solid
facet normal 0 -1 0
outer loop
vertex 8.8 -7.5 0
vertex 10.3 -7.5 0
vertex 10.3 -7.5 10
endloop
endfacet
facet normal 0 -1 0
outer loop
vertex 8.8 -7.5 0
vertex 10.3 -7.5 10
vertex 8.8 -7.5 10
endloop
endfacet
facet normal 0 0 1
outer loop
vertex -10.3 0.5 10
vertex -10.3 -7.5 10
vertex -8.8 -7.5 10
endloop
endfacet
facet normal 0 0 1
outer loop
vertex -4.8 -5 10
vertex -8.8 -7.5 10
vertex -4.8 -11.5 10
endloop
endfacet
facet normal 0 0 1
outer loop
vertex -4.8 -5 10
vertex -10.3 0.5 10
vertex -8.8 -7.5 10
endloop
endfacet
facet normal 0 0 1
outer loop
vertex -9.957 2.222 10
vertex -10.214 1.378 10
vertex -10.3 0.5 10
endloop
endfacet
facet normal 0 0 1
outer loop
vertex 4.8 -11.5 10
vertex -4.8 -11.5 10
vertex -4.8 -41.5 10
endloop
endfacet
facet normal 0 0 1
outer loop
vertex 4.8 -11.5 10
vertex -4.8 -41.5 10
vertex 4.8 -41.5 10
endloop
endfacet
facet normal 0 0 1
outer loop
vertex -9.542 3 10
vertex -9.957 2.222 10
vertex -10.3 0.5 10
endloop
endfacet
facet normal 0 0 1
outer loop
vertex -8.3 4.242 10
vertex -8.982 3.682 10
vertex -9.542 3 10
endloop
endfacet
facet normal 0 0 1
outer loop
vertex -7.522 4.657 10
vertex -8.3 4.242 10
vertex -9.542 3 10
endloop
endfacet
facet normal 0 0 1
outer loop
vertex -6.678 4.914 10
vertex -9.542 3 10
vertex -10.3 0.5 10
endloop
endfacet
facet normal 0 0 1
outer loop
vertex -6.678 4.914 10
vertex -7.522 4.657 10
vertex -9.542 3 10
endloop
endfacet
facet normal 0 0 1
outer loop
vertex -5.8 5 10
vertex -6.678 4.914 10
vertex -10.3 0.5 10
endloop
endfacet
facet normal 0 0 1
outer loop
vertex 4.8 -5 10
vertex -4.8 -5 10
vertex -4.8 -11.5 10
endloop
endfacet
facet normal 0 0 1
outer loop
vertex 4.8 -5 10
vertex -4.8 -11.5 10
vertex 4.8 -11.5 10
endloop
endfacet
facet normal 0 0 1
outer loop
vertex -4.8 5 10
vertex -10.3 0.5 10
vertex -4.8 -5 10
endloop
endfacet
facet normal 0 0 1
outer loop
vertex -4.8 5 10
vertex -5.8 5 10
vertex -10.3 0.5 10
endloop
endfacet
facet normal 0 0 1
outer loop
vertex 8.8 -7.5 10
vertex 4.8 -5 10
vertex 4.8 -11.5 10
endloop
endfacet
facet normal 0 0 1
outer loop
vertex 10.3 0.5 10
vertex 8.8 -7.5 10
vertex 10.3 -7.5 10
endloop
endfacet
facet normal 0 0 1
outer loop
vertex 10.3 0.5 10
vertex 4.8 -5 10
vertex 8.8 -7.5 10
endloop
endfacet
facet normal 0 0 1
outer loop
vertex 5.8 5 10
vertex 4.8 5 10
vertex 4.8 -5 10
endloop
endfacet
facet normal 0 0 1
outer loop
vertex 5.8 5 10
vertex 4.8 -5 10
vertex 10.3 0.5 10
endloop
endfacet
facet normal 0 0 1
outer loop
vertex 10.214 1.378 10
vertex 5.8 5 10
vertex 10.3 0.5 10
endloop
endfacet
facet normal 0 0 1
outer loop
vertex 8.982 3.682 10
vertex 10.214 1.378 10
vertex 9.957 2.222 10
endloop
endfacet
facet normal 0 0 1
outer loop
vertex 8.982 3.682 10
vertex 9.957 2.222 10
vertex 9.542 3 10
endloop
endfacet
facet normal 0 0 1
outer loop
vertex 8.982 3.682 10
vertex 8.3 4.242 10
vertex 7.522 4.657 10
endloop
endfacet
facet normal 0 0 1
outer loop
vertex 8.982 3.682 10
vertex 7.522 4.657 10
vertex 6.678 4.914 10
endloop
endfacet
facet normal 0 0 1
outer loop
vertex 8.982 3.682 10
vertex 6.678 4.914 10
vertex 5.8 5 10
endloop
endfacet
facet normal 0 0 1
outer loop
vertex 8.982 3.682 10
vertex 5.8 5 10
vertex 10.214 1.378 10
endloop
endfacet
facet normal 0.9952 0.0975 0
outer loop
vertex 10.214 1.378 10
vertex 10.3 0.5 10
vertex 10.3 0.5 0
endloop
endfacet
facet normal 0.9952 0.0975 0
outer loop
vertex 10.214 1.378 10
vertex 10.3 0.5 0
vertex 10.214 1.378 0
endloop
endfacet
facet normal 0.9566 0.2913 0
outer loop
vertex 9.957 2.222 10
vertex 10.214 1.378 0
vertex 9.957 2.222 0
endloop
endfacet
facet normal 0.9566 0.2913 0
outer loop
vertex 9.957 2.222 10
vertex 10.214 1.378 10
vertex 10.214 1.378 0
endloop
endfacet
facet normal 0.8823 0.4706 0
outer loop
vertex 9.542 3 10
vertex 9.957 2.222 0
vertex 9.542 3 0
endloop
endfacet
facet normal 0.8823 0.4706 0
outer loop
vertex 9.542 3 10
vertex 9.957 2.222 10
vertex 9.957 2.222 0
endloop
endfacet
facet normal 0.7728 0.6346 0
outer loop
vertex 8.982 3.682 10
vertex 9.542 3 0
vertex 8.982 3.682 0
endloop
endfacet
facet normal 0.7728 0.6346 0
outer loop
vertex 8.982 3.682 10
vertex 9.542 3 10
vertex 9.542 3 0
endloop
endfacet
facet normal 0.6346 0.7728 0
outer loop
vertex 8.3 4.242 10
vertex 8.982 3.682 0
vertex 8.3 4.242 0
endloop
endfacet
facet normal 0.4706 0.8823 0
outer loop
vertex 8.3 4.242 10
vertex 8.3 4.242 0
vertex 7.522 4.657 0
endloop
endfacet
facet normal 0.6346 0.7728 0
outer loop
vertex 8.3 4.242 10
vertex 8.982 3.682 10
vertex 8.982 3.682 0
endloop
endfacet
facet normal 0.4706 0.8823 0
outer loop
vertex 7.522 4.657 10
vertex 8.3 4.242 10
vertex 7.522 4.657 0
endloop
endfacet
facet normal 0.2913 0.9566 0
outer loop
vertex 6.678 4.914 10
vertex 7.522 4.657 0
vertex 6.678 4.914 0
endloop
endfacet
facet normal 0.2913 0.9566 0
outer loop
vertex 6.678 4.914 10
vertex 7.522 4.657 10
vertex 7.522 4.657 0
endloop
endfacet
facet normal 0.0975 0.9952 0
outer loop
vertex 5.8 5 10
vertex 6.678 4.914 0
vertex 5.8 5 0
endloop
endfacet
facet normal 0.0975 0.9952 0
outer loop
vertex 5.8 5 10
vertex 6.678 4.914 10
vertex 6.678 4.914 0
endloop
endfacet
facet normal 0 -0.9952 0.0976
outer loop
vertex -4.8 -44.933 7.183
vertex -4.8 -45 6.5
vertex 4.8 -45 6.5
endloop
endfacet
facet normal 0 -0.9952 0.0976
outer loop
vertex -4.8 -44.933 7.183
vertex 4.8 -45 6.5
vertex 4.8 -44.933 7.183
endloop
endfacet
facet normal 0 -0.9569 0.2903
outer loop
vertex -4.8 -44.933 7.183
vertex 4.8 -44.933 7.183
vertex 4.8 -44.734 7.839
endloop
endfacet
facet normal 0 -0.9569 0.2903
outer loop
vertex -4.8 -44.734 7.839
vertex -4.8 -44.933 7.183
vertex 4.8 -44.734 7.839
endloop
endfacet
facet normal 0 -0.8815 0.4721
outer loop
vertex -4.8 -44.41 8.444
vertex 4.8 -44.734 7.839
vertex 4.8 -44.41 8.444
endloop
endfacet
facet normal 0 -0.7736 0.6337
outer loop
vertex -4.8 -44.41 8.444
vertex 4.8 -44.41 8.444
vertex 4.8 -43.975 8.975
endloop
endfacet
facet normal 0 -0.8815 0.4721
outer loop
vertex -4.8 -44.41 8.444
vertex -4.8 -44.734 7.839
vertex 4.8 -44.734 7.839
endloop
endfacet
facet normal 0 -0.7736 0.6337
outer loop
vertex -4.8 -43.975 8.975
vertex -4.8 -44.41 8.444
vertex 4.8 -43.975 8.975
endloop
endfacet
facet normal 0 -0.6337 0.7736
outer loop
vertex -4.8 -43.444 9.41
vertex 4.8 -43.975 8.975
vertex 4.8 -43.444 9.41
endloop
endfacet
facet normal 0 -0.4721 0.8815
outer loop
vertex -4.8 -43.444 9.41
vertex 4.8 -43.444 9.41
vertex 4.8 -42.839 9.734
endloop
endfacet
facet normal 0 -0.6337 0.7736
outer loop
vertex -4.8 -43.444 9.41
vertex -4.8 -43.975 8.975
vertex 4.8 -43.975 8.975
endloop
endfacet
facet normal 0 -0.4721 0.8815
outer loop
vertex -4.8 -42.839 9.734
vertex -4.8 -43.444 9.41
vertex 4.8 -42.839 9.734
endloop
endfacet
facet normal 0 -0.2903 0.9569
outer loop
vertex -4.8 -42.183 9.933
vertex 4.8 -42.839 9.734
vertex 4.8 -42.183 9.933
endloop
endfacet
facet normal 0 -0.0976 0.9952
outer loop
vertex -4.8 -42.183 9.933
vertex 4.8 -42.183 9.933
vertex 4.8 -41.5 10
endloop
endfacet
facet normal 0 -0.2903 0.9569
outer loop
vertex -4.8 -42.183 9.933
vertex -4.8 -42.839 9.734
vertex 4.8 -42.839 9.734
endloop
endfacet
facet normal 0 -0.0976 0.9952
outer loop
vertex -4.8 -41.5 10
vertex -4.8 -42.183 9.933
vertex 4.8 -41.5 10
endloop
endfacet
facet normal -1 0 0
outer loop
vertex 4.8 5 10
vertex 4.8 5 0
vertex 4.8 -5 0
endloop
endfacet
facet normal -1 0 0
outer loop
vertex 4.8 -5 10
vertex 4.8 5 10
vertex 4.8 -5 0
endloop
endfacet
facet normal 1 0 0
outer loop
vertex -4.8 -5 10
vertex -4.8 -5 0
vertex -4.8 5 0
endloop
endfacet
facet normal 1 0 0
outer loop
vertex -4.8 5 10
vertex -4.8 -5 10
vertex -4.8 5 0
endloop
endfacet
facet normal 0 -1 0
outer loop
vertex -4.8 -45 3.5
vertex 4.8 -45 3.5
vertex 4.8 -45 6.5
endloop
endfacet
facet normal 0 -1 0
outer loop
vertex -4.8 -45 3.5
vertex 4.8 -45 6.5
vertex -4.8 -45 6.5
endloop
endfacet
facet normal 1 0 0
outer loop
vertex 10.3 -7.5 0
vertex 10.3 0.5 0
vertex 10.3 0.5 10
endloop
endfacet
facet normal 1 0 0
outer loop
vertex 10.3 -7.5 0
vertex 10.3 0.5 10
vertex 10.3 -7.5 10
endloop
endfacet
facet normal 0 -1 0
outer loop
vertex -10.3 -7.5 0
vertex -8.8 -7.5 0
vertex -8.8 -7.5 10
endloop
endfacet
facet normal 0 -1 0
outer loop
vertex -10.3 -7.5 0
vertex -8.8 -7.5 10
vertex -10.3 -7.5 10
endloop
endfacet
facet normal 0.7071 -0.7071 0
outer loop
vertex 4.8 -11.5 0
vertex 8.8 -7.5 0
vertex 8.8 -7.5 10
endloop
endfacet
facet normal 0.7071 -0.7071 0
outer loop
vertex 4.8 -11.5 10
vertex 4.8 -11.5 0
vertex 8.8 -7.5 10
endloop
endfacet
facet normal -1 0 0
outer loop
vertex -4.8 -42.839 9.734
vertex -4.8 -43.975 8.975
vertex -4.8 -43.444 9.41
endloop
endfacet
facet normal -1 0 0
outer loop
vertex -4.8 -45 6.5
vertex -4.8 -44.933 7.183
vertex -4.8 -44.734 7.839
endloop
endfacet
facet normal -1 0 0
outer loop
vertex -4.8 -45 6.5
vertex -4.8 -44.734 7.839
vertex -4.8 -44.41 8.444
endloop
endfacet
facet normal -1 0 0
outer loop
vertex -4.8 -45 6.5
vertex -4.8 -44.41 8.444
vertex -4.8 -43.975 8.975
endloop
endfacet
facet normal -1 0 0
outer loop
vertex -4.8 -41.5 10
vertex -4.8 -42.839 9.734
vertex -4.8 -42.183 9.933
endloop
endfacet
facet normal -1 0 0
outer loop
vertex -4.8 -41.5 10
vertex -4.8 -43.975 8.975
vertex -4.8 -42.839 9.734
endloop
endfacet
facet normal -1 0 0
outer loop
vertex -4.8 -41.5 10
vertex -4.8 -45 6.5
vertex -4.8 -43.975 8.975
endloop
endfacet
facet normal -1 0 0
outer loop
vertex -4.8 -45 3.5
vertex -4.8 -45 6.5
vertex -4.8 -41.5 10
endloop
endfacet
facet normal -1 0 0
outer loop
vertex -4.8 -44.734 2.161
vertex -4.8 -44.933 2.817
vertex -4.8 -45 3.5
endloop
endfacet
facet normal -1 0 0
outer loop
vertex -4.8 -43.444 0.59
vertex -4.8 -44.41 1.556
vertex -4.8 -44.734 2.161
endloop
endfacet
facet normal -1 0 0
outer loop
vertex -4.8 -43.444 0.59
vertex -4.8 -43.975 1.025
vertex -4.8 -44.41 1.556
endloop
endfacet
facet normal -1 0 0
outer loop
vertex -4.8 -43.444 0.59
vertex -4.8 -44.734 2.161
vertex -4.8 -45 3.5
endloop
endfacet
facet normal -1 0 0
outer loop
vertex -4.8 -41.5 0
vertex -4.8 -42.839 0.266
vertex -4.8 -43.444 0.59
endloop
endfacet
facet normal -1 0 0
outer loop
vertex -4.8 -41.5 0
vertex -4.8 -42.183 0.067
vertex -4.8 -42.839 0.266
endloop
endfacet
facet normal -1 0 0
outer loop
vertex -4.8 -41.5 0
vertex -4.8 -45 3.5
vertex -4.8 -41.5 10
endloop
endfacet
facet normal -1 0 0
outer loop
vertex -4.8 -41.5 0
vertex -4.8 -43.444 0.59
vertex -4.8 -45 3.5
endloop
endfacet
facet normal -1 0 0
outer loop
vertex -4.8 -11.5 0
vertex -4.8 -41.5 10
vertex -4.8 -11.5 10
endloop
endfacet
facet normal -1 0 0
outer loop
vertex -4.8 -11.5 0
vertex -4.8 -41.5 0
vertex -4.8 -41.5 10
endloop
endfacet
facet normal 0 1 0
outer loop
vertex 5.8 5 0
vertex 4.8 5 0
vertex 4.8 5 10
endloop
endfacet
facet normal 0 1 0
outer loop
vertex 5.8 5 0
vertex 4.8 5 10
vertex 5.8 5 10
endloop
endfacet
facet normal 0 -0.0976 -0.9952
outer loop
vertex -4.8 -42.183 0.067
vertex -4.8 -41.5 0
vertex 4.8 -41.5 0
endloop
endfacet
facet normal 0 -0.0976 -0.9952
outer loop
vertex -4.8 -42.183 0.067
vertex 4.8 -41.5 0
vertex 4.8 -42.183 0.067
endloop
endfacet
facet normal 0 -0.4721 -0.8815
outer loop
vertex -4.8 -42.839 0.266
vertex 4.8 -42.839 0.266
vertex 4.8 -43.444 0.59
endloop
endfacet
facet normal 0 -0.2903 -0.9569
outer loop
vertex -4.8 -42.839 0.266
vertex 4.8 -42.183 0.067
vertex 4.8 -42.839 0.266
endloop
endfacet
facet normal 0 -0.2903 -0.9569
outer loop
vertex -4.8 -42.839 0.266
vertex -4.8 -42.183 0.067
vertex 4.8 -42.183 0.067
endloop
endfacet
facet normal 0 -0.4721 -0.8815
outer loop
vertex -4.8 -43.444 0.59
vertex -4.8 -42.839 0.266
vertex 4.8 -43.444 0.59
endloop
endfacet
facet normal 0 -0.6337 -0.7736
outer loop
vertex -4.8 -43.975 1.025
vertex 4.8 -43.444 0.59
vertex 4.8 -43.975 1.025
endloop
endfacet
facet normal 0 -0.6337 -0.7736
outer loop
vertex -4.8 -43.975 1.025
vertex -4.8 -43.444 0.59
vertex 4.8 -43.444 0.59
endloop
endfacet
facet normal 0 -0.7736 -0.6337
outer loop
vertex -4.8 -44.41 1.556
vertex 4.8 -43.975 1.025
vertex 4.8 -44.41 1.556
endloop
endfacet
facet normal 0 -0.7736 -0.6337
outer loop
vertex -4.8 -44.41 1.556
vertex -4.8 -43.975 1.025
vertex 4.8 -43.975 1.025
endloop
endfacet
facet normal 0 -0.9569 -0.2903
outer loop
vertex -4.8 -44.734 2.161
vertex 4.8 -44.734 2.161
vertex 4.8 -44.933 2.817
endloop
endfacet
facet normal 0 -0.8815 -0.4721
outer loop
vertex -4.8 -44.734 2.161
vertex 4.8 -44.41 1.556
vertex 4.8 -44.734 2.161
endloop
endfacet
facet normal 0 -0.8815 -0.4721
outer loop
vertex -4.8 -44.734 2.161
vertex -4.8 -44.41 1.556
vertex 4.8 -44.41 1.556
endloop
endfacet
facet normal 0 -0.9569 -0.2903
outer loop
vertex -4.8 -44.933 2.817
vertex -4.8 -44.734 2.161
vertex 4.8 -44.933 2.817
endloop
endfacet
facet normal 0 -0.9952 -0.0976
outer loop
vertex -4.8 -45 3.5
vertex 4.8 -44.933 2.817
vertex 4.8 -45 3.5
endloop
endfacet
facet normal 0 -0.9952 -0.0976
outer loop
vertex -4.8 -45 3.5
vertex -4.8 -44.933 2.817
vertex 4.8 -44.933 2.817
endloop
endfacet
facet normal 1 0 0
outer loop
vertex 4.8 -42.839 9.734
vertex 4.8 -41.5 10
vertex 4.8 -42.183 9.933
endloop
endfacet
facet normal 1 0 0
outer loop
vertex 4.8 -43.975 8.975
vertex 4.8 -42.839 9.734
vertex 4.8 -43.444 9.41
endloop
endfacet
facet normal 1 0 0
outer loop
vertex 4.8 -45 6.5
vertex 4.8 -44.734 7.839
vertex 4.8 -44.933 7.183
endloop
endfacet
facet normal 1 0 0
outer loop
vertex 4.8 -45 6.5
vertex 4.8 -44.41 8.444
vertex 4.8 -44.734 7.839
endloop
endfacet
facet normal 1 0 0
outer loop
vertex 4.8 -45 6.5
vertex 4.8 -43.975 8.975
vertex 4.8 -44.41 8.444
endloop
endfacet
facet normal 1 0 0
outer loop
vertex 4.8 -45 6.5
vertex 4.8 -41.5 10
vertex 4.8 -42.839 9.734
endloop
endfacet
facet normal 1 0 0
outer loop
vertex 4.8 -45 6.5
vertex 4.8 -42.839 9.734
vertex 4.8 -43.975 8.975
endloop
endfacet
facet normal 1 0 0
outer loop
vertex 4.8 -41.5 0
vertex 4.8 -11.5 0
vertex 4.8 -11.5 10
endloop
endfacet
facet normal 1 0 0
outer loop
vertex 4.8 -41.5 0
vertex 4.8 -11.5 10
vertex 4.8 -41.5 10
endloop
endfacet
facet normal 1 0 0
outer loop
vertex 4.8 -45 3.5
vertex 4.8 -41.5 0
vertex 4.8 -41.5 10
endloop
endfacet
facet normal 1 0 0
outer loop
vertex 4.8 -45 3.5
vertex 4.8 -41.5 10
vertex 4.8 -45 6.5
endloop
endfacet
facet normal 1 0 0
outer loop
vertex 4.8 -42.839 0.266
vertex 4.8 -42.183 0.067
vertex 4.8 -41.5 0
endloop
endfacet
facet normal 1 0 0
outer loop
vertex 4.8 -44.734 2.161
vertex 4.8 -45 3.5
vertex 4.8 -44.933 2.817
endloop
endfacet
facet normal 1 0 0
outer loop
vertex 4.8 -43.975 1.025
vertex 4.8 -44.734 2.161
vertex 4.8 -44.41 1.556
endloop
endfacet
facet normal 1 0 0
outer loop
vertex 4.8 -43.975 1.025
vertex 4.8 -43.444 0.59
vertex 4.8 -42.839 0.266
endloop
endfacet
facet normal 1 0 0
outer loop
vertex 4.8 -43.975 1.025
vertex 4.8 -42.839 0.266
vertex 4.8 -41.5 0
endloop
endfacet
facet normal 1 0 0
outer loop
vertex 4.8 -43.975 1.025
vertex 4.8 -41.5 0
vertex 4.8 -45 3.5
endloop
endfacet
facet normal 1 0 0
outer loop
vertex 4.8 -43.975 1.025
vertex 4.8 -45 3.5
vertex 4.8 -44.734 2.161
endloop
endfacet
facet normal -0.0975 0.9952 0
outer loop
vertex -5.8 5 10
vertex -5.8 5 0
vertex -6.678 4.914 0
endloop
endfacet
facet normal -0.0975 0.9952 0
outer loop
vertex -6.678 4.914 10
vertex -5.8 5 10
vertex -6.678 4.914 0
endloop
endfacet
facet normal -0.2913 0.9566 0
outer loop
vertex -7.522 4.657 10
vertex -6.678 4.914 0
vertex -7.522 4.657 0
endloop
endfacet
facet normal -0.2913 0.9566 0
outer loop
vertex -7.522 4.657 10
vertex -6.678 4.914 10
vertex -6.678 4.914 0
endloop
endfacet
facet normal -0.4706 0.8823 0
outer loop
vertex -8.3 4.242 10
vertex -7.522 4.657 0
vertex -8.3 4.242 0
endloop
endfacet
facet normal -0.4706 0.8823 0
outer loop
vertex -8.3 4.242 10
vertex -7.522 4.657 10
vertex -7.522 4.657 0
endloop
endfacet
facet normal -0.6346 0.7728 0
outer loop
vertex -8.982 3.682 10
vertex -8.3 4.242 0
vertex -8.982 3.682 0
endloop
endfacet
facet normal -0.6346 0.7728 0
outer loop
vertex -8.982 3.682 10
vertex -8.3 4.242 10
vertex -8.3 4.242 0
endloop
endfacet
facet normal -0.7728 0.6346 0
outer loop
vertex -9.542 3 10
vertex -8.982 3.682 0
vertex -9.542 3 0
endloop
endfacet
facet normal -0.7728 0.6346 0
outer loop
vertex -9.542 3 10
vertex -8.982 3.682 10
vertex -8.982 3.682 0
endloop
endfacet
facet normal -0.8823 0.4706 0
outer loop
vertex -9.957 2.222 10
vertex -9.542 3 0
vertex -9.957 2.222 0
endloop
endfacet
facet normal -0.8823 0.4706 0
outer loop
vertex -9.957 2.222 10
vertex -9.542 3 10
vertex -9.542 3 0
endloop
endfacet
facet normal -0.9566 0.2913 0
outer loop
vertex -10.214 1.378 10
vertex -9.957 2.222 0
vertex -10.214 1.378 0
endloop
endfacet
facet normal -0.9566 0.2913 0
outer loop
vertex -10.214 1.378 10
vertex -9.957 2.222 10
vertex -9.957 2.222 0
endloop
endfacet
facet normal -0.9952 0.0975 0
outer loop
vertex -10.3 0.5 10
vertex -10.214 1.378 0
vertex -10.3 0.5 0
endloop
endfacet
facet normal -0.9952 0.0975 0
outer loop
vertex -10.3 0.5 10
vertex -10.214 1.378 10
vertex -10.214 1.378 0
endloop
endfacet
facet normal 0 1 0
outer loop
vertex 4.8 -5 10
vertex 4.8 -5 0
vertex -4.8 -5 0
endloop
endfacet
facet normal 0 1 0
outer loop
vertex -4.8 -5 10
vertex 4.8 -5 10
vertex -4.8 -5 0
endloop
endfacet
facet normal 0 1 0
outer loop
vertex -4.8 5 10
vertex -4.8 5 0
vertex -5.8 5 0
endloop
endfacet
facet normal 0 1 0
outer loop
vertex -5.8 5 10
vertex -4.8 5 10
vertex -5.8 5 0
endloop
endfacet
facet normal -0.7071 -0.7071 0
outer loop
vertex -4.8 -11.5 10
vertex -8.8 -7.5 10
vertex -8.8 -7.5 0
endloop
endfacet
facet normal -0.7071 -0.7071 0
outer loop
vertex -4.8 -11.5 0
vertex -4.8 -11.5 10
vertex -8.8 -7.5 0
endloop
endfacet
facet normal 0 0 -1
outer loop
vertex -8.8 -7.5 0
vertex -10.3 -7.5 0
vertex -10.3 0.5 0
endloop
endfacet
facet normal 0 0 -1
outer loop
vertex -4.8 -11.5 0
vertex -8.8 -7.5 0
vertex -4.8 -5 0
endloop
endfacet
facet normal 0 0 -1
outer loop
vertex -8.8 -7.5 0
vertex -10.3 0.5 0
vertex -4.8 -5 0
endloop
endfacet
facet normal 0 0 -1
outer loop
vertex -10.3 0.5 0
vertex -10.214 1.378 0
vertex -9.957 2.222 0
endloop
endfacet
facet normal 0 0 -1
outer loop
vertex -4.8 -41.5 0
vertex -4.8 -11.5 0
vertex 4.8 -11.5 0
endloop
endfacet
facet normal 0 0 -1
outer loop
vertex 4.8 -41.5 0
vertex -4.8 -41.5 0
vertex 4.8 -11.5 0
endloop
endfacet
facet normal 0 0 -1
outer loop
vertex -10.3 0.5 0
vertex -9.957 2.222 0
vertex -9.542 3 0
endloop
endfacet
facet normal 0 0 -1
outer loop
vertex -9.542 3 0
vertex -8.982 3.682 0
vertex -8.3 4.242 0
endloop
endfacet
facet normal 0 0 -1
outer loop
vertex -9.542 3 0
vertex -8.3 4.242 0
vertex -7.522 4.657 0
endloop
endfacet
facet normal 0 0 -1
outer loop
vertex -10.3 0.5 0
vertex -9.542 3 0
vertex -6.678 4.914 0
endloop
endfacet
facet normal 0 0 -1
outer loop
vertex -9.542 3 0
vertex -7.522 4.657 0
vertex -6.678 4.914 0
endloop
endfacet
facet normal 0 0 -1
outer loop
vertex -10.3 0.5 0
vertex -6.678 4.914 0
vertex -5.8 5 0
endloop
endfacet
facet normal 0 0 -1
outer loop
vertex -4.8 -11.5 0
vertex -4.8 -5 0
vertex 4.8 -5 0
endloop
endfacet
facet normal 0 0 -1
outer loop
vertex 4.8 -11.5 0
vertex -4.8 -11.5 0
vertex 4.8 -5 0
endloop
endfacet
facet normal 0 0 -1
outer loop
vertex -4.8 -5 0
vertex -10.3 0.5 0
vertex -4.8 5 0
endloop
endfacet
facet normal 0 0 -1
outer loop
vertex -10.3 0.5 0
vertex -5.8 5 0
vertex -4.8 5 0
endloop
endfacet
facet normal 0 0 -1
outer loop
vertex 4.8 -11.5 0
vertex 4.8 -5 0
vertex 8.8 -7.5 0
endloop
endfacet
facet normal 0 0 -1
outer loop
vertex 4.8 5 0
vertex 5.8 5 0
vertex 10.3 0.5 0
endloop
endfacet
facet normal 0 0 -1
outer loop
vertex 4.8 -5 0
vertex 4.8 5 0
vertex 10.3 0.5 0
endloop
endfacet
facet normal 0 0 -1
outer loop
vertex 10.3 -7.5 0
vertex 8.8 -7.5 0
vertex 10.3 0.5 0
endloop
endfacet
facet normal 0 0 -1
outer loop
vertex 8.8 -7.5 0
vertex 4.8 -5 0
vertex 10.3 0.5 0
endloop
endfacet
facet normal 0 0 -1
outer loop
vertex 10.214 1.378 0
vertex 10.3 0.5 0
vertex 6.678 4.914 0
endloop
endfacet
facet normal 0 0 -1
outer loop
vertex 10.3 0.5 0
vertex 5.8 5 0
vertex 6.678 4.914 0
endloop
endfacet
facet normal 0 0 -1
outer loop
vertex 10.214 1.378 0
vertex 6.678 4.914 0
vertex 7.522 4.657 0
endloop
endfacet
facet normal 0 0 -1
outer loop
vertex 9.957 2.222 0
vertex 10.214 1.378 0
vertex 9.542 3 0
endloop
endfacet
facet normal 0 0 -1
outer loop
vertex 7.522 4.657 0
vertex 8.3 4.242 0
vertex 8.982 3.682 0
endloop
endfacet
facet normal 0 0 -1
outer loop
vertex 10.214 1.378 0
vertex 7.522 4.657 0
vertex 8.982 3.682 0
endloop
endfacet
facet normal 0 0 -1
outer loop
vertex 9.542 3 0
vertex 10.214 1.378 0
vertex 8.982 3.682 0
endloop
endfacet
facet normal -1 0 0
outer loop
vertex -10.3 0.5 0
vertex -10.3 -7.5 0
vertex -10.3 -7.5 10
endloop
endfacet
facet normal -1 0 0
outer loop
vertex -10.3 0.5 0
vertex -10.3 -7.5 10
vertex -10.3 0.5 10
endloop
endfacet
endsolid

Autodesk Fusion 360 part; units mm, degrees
sketch "Sketch1" plane through (0, 0, 0) normal (0, 0, 1) x (1, 0, 0)
  line L0 (4.8, -5) -> (-4.8, -5)
  line L1 (-4.8, -5) -> (-4.8, 5)
  line L2 (4.8, 5) -> (4.8, -5)
  line L3 (4.8, -5) -> (-4.8, 5) construction
  line L4 (-4.8, -5) -> (4.8, 5) construction
  line L5 (-4.8, -5) -> (4.8, -5)
  line L6 (4.8, -7.5) -> (4.8, -45)
  line L7 (4.8, -45) -> (-4.8, -45)
  line L8 (-4.8, -45) -> (-4.8, -7.5)
  line L9 (-10.3, -7.5) -> (-10.3, 7.5)
  line L10 (10.3, 7.5) -> (10.3, -7.5)
  line L11 (10.3, -7.5) -> (-10.3, 7.5) construction
  line L12 (-10.3, -7.5) -> (10.3, 7.5) construction
  line L13 (4.8, 5) -> (10.3, 5)
  line L14 (-4.8, 5) -> (-10.3, 5)
  line L15 (10.3, -7.5) -> (4.8, -7.5)
  line L16 (-4.8, -7.5) -> (-10.3, -7.5)
  dimension "d1" = 9.6
  dimension "d3" = 9.6
  dimension "d4" = 40
  dimension "d5" = 20.6
extrude "Extrude1" add sketch "Sketch1" along normal blind 10
fillet "Fillet1" radius 3.5 2 edges at (0, -45, 10) (0, -45, 0)
chamfer "Chamfer1" distance 4 angle 45 2 edges at (-4.8, -7.5, 5) (4.8, -7.5, 5)
fillet "Fillet2" radius 4.5 2 edges at (10.3, 5, 5) (-10.3, 5, 5)
